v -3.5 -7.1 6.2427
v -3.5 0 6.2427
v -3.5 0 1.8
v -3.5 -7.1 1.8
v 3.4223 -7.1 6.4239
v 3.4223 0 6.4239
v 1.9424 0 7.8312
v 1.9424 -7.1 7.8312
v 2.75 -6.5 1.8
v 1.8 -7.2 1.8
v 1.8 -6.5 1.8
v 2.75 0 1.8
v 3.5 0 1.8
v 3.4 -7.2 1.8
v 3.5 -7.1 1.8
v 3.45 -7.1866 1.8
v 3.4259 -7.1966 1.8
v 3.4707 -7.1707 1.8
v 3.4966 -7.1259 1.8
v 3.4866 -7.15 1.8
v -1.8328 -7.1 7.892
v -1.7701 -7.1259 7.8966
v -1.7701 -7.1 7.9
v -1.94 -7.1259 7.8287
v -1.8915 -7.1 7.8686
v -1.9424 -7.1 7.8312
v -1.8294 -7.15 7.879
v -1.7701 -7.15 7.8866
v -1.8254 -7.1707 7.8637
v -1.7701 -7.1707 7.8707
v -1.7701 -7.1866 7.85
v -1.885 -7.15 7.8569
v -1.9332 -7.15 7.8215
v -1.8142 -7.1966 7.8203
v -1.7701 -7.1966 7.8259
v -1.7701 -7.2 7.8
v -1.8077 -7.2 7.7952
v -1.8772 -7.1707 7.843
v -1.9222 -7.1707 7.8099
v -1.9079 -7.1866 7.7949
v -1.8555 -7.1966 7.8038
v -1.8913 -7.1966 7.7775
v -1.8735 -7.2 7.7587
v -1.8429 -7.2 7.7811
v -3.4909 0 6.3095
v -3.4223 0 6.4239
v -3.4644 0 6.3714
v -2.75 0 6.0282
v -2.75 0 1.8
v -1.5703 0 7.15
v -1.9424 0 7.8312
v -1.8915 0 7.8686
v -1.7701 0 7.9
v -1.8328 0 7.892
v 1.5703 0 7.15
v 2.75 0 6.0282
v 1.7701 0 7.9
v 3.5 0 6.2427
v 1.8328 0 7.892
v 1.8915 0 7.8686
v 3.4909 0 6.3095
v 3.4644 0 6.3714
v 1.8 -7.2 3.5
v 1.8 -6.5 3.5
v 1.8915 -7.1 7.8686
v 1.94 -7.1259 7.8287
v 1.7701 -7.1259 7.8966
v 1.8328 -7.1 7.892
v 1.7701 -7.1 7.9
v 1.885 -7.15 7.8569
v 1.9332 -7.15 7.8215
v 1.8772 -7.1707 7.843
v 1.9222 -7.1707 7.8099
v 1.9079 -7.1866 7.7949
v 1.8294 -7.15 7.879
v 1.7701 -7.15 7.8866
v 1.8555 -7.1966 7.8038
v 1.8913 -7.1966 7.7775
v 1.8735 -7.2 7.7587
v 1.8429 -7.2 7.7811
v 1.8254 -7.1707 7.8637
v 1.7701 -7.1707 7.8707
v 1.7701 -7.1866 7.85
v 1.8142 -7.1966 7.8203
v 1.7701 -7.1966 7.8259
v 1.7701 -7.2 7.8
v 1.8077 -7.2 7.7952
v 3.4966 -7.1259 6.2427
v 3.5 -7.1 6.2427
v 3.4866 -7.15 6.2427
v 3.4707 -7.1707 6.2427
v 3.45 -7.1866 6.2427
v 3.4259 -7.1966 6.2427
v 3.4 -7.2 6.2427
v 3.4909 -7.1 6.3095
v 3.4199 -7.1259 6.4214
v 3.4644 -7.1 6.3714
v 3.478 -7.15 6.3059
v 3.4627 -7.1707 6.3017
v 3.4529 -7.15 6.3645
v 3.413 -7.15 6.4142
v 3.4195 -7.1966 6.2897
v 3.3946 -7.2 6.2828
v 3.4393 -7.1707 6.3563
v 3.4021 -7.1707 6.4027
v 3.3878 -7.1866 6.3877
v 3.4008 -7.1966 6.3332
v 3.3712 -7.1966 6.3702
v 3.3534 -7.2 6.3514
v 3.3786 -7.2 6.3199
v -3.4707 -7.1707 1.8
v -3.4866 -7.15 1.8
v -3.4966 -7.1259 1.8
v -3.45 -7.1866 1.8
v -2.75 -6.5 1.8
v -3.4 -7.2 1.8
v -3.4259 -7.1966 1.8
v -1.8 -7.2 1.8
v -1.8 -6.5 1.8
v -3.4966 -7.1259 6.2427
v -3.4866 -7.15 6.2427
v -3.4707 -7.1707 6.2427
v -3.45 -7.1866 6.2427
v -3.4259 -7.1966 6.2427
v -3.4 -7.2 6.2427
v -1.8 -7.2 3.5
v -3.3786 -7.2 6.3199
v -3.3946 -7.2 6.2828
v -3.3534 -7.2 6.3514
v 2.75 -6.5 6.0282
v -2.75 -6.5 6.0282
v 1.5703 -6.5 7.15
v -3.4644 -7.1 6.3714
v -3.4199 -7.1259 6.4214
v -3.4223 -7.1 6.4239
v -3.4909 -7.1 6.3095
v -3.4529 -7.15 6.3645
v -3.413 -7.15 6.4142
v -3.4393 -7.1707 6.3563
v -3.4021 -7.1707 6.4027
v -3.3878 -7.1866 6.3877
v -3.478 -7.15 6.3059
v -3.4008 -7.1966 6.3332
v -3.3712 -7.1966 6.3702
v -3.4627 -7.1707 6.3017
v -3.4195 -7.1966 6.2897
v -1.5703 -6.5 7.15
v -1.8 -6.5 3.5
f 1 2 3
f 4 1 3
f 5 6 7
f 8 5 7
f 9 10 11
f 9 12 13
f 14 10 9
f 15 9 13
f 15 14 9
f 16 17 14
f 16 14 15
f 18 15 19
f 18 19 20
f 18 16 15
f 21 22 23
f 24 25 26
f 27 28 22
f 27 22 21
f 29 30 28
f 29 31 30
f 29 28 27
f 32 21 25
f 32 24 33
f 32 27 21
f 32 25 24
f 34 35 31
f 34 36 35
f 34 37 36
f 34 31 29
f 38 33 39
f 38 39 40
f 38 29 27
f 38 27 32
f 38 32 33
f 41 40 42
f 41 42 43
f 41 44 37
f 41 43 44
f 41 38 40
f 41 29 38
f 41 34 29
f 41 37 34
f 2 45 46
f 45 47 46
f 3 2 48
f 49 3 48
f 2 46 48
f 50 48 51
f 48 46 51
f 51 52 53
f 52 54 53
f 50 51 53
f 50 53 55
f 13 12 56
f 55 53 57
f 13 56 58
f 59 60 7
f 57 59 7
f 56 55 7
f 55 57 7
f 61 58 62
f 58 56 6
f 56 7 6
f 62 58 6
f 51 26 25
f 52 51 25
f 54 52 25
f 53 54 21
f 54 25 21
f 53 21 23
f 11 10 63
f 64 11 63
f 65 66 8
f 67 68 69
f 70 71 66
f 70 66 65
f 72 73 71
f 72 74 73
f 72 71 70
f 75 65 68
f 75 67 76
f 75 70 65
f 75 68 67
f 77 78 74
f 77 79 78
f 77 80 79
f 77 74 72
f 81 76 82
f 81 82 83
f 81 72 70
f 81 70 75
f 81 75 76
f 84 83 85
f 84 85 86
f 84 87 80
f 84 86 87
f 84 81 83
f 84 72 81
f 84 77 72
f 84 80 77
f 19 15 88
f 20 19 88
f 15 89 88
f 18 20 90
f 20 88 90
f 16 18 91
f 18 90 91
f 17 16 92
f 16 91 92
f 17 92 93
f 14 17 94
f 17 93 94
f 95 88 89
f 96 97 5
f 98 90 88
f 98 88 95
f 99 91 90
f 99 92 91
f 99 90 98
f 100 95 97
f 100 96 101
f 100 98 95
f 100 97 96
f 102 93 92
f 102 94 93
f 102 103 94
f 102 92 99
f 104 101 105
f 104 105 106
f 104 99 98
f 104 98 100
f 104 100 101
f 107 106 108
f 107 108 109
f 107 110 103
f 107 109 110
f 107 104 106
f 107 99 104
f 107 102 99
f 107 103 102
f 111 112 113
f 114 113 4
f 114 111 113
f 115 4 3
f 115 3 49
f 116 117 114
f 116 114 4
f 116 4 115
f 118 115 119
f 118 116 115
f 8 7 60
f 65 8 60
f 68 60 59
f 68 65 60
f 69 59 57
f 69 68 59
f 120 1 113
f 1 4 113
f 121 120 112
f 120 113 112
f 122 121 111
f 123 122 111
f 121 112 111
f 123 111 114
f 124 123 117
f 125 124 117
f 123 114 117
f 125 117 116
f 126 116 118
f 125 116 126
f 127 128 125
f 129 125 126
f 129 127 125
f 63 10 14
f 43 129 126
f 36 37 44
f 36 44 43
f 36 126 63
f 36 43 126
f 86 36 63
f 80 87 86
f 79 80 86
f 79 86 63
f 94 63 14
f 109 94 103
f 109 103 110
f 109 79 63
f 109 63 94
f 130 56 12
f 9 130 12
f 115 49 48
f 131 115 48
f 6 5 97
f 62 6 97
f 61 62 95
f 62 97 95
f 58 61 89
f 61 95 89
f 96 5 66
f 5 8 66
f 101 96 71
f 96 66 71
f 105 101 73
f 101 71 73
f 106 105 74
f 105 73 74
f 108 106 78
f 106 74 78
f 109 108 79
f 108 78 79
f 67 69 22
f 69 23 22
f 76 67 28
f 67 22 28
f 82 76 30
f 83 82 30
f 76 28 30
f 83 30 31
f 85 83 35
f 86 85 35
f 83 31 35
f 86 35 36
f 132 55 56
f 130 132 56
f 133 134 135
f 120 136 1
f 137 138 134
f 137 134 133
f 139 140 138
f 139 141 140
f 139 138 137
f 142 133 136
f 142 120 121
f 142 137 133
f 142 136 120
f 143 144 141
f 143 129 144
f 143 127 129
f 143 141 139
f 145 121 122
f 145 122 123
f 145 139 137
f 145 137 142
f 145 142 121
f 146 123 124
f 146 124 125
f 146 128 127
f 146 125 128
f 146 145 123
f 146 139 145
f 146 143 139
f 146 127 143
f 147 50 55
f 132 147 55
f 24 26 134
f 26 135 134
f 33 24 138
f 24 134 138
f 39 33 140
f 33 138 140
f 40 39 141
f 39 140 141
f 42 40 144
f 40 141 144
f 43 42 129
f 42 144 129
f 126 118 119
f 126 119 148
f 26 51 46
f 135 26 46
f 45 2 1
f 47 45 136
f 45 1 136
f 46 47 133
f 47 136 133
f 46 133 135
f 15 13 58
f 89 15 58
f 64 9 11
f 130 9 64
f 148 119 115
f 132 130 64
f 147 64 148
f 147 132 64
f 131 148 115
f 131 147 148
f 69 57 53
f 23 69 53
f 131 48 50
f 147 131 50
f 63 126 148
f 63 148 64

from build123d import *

# Parameters (mm, degrees)
F1_DEPTH = 7.2
F2_W     = 3.6
F2_H     = 2.4
F3_DEPTH = 7.201
F5_DEPTH = 6.5
F6_W     = 7
F6_H     = 0.7
F7_DEPTH = 7.201
F8_R     = 0.25
F9_R     = 0.1


with BuildPart() as f1:
    # F0 (on Front) → F1 (new body)
    with BuildSketch(Plane.XZ):
        Polygon((-3.5, 6.35), (-3.5, 1.1), (3.5, 1.1), (3.5, 6.35), (1.87, 7.9), (-1.87, 7.9), align=None)
    extrude(amount=F1_DEPTH)

    # F2 (on face) → F3 (cut, through all)
    with BuildSketch(Plane.XZ.offset(7.2)):
        with Locations((0, 2.3)):
            Rectangle(F2_W, F2_H)
    extrude(amount=-F3_DEPTH, mode=Mode.SUBTRACT)

    # F4 (on face) → F5 (cut)
    with BuildSketch(Plane(origin=(0, 0, 0), x_dir=(-1, 0, 0), z_dir=(0, 1, 0))):
        Polygon((-2.75, 1.1), (2.75, 1.1), (2.75, 6.028231), (1.570333, 7.15), (-1.570333, 7.15), (-2.75, 6.028231), align=None)
    extrude(amount=-F5_DEPTH, mode=Mode.SUBTRACT)

    # F6 (on face) → F7 (cut, through all)
    with BuildSketch(Plane.XZ.offset(7.2)):
        with Locations((0, 1.45)):
            Rectangle(F6_W, F6_H)
    extrude(amount=-F7_DEPTH, mode=Mode.SUBTRACT)

    # F8
    f8_edges = [f1.edges().sort_by_distance(p)[0] for p in [
        (-3.5, -3.6, 6.35),
        (-1.87, -3.6, 7.9),
        (1.87, -3.6, 7.9),
        (3.5, -3.6, 6.35),
    ]]
    fillet(f8_edges, radius=F8_R)

    # F9
    f9_edges = [f1.edges().sort_by_distance(p)[0] for p in [
        (-3.5, -7.2, 4.021372),
    ]]
    fillet(f9_edges, radius=F9_R)


solid = f1.part
